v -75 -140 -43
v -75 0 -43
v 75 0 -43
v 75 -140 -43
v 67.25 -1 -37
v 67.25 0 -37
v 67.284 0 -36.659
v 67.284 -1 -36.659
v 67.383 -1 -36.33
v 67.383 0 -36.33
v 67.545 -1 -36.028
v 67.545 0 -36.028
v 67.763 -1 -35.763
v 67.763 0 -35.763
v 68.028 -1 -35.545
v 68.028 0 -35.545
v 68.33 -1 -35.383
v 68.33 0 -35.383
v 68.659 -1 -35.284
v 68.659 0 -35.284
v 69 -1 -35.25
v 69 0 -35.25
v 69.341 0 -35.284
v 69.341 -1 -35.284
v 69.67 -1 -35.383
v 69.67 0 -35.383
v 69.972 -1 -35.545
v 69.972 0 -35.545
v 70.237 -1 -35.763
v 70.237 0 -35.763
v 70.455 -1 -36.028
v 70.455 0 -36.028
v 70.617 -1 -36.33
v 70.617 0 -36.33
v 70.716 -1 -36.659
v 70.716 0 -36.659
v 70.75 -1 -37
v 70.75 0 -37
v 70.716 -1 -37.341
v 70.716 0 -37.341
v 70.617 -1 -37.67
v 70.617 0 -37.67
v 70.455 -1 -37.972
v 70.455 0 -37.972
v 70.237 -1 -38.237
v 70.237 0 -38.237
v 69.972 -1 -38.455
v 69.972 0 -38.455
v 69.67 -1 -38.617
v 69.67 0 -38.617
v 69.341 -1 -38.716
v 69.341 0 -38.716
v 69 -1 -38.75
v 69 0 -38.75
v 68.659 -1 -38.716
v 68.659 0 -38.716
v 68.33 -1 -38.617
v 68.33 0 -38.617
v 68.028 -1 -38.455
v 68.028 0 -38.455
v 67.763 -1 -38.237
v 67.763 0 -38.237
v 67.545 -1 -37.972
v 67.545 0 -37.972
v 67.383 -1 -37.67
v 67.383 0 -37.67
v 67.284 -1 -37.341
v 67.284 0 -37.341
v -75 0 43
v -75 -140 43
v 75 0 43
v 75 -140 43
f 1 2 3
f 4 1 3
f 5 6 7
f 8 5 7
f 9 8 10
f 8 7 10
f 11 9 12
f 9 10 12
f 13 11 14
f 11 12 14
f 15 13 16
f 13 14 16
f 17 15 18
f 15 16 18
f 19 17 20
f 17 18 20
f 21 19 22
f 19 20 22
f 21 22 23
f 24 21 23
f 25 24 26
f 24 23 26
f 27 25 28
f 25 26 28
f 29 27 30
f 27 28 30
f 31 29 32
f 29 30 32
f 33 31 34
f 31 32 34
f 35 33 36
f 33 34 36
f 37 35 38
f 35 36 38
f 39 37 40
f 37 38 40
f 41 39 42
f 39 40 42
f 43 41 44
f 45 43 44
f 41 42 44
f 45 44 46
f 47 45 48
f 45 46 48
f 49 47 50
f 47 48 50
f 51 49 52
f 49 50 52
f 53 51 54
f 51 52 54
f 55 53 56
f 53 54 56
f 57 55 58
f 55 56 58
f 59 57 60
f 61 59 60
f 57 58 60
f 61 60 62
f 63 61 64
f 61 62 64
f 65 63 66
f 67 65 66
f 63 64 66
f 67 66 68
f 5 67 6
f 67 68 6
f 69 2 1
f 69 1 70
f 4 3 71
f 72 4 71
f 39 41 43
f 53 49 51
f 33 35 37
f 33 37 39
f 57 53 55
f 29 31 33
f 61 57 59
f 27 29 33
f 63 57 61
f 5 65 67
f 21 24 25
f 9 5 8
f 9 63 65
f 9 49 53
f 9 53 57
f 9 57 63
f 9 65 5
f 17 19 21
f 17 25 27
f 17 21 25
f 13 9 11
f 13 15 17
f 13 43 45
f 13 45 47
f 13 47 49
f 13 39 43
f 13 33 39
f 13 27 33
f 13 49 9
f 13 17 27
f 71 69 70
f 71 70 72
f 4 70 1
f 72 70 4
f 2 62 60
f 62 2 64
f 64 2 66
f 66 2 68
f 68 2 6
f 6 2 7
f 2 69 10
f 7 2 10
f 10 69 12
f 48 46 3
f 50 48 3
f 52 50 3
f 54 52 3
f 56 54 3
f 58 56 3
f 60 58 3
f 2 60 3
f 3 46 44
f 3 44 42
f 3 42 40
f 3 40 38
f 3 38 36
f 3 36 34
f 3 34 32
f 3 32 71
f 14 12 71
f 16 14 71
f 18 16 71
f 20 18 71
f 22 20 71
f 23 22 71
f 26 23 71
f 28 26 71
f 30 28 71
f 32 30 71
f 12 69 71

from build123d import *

# Parameters (mm, degrees)
F0_W     = 150
F0_H     = 86
F1_DEPTH = 140
F2_R     = 1.75
F3_DEPTH = 1


with BuildPart() as f1:
    # F0 (on Front) → F1 (new body)
    with BuildSketch(Plane.XZ):
        Rectangle(F0_W, F0_H)
    extrude(amount=F1_DEPTH)

    # F2 (on face) → F3 (cut)
    with BuildSketch(Plane(origin=(0, 0, 0), x_dir=(-1, 0, 0), z_dir=(0, 1, 0))):
        with Locations((-69, -37)):
            Circle(F2_R)
    extrude(amount=-F3_DEPTH, mode=Mode.SUBTRACT)


solid = f1.part
